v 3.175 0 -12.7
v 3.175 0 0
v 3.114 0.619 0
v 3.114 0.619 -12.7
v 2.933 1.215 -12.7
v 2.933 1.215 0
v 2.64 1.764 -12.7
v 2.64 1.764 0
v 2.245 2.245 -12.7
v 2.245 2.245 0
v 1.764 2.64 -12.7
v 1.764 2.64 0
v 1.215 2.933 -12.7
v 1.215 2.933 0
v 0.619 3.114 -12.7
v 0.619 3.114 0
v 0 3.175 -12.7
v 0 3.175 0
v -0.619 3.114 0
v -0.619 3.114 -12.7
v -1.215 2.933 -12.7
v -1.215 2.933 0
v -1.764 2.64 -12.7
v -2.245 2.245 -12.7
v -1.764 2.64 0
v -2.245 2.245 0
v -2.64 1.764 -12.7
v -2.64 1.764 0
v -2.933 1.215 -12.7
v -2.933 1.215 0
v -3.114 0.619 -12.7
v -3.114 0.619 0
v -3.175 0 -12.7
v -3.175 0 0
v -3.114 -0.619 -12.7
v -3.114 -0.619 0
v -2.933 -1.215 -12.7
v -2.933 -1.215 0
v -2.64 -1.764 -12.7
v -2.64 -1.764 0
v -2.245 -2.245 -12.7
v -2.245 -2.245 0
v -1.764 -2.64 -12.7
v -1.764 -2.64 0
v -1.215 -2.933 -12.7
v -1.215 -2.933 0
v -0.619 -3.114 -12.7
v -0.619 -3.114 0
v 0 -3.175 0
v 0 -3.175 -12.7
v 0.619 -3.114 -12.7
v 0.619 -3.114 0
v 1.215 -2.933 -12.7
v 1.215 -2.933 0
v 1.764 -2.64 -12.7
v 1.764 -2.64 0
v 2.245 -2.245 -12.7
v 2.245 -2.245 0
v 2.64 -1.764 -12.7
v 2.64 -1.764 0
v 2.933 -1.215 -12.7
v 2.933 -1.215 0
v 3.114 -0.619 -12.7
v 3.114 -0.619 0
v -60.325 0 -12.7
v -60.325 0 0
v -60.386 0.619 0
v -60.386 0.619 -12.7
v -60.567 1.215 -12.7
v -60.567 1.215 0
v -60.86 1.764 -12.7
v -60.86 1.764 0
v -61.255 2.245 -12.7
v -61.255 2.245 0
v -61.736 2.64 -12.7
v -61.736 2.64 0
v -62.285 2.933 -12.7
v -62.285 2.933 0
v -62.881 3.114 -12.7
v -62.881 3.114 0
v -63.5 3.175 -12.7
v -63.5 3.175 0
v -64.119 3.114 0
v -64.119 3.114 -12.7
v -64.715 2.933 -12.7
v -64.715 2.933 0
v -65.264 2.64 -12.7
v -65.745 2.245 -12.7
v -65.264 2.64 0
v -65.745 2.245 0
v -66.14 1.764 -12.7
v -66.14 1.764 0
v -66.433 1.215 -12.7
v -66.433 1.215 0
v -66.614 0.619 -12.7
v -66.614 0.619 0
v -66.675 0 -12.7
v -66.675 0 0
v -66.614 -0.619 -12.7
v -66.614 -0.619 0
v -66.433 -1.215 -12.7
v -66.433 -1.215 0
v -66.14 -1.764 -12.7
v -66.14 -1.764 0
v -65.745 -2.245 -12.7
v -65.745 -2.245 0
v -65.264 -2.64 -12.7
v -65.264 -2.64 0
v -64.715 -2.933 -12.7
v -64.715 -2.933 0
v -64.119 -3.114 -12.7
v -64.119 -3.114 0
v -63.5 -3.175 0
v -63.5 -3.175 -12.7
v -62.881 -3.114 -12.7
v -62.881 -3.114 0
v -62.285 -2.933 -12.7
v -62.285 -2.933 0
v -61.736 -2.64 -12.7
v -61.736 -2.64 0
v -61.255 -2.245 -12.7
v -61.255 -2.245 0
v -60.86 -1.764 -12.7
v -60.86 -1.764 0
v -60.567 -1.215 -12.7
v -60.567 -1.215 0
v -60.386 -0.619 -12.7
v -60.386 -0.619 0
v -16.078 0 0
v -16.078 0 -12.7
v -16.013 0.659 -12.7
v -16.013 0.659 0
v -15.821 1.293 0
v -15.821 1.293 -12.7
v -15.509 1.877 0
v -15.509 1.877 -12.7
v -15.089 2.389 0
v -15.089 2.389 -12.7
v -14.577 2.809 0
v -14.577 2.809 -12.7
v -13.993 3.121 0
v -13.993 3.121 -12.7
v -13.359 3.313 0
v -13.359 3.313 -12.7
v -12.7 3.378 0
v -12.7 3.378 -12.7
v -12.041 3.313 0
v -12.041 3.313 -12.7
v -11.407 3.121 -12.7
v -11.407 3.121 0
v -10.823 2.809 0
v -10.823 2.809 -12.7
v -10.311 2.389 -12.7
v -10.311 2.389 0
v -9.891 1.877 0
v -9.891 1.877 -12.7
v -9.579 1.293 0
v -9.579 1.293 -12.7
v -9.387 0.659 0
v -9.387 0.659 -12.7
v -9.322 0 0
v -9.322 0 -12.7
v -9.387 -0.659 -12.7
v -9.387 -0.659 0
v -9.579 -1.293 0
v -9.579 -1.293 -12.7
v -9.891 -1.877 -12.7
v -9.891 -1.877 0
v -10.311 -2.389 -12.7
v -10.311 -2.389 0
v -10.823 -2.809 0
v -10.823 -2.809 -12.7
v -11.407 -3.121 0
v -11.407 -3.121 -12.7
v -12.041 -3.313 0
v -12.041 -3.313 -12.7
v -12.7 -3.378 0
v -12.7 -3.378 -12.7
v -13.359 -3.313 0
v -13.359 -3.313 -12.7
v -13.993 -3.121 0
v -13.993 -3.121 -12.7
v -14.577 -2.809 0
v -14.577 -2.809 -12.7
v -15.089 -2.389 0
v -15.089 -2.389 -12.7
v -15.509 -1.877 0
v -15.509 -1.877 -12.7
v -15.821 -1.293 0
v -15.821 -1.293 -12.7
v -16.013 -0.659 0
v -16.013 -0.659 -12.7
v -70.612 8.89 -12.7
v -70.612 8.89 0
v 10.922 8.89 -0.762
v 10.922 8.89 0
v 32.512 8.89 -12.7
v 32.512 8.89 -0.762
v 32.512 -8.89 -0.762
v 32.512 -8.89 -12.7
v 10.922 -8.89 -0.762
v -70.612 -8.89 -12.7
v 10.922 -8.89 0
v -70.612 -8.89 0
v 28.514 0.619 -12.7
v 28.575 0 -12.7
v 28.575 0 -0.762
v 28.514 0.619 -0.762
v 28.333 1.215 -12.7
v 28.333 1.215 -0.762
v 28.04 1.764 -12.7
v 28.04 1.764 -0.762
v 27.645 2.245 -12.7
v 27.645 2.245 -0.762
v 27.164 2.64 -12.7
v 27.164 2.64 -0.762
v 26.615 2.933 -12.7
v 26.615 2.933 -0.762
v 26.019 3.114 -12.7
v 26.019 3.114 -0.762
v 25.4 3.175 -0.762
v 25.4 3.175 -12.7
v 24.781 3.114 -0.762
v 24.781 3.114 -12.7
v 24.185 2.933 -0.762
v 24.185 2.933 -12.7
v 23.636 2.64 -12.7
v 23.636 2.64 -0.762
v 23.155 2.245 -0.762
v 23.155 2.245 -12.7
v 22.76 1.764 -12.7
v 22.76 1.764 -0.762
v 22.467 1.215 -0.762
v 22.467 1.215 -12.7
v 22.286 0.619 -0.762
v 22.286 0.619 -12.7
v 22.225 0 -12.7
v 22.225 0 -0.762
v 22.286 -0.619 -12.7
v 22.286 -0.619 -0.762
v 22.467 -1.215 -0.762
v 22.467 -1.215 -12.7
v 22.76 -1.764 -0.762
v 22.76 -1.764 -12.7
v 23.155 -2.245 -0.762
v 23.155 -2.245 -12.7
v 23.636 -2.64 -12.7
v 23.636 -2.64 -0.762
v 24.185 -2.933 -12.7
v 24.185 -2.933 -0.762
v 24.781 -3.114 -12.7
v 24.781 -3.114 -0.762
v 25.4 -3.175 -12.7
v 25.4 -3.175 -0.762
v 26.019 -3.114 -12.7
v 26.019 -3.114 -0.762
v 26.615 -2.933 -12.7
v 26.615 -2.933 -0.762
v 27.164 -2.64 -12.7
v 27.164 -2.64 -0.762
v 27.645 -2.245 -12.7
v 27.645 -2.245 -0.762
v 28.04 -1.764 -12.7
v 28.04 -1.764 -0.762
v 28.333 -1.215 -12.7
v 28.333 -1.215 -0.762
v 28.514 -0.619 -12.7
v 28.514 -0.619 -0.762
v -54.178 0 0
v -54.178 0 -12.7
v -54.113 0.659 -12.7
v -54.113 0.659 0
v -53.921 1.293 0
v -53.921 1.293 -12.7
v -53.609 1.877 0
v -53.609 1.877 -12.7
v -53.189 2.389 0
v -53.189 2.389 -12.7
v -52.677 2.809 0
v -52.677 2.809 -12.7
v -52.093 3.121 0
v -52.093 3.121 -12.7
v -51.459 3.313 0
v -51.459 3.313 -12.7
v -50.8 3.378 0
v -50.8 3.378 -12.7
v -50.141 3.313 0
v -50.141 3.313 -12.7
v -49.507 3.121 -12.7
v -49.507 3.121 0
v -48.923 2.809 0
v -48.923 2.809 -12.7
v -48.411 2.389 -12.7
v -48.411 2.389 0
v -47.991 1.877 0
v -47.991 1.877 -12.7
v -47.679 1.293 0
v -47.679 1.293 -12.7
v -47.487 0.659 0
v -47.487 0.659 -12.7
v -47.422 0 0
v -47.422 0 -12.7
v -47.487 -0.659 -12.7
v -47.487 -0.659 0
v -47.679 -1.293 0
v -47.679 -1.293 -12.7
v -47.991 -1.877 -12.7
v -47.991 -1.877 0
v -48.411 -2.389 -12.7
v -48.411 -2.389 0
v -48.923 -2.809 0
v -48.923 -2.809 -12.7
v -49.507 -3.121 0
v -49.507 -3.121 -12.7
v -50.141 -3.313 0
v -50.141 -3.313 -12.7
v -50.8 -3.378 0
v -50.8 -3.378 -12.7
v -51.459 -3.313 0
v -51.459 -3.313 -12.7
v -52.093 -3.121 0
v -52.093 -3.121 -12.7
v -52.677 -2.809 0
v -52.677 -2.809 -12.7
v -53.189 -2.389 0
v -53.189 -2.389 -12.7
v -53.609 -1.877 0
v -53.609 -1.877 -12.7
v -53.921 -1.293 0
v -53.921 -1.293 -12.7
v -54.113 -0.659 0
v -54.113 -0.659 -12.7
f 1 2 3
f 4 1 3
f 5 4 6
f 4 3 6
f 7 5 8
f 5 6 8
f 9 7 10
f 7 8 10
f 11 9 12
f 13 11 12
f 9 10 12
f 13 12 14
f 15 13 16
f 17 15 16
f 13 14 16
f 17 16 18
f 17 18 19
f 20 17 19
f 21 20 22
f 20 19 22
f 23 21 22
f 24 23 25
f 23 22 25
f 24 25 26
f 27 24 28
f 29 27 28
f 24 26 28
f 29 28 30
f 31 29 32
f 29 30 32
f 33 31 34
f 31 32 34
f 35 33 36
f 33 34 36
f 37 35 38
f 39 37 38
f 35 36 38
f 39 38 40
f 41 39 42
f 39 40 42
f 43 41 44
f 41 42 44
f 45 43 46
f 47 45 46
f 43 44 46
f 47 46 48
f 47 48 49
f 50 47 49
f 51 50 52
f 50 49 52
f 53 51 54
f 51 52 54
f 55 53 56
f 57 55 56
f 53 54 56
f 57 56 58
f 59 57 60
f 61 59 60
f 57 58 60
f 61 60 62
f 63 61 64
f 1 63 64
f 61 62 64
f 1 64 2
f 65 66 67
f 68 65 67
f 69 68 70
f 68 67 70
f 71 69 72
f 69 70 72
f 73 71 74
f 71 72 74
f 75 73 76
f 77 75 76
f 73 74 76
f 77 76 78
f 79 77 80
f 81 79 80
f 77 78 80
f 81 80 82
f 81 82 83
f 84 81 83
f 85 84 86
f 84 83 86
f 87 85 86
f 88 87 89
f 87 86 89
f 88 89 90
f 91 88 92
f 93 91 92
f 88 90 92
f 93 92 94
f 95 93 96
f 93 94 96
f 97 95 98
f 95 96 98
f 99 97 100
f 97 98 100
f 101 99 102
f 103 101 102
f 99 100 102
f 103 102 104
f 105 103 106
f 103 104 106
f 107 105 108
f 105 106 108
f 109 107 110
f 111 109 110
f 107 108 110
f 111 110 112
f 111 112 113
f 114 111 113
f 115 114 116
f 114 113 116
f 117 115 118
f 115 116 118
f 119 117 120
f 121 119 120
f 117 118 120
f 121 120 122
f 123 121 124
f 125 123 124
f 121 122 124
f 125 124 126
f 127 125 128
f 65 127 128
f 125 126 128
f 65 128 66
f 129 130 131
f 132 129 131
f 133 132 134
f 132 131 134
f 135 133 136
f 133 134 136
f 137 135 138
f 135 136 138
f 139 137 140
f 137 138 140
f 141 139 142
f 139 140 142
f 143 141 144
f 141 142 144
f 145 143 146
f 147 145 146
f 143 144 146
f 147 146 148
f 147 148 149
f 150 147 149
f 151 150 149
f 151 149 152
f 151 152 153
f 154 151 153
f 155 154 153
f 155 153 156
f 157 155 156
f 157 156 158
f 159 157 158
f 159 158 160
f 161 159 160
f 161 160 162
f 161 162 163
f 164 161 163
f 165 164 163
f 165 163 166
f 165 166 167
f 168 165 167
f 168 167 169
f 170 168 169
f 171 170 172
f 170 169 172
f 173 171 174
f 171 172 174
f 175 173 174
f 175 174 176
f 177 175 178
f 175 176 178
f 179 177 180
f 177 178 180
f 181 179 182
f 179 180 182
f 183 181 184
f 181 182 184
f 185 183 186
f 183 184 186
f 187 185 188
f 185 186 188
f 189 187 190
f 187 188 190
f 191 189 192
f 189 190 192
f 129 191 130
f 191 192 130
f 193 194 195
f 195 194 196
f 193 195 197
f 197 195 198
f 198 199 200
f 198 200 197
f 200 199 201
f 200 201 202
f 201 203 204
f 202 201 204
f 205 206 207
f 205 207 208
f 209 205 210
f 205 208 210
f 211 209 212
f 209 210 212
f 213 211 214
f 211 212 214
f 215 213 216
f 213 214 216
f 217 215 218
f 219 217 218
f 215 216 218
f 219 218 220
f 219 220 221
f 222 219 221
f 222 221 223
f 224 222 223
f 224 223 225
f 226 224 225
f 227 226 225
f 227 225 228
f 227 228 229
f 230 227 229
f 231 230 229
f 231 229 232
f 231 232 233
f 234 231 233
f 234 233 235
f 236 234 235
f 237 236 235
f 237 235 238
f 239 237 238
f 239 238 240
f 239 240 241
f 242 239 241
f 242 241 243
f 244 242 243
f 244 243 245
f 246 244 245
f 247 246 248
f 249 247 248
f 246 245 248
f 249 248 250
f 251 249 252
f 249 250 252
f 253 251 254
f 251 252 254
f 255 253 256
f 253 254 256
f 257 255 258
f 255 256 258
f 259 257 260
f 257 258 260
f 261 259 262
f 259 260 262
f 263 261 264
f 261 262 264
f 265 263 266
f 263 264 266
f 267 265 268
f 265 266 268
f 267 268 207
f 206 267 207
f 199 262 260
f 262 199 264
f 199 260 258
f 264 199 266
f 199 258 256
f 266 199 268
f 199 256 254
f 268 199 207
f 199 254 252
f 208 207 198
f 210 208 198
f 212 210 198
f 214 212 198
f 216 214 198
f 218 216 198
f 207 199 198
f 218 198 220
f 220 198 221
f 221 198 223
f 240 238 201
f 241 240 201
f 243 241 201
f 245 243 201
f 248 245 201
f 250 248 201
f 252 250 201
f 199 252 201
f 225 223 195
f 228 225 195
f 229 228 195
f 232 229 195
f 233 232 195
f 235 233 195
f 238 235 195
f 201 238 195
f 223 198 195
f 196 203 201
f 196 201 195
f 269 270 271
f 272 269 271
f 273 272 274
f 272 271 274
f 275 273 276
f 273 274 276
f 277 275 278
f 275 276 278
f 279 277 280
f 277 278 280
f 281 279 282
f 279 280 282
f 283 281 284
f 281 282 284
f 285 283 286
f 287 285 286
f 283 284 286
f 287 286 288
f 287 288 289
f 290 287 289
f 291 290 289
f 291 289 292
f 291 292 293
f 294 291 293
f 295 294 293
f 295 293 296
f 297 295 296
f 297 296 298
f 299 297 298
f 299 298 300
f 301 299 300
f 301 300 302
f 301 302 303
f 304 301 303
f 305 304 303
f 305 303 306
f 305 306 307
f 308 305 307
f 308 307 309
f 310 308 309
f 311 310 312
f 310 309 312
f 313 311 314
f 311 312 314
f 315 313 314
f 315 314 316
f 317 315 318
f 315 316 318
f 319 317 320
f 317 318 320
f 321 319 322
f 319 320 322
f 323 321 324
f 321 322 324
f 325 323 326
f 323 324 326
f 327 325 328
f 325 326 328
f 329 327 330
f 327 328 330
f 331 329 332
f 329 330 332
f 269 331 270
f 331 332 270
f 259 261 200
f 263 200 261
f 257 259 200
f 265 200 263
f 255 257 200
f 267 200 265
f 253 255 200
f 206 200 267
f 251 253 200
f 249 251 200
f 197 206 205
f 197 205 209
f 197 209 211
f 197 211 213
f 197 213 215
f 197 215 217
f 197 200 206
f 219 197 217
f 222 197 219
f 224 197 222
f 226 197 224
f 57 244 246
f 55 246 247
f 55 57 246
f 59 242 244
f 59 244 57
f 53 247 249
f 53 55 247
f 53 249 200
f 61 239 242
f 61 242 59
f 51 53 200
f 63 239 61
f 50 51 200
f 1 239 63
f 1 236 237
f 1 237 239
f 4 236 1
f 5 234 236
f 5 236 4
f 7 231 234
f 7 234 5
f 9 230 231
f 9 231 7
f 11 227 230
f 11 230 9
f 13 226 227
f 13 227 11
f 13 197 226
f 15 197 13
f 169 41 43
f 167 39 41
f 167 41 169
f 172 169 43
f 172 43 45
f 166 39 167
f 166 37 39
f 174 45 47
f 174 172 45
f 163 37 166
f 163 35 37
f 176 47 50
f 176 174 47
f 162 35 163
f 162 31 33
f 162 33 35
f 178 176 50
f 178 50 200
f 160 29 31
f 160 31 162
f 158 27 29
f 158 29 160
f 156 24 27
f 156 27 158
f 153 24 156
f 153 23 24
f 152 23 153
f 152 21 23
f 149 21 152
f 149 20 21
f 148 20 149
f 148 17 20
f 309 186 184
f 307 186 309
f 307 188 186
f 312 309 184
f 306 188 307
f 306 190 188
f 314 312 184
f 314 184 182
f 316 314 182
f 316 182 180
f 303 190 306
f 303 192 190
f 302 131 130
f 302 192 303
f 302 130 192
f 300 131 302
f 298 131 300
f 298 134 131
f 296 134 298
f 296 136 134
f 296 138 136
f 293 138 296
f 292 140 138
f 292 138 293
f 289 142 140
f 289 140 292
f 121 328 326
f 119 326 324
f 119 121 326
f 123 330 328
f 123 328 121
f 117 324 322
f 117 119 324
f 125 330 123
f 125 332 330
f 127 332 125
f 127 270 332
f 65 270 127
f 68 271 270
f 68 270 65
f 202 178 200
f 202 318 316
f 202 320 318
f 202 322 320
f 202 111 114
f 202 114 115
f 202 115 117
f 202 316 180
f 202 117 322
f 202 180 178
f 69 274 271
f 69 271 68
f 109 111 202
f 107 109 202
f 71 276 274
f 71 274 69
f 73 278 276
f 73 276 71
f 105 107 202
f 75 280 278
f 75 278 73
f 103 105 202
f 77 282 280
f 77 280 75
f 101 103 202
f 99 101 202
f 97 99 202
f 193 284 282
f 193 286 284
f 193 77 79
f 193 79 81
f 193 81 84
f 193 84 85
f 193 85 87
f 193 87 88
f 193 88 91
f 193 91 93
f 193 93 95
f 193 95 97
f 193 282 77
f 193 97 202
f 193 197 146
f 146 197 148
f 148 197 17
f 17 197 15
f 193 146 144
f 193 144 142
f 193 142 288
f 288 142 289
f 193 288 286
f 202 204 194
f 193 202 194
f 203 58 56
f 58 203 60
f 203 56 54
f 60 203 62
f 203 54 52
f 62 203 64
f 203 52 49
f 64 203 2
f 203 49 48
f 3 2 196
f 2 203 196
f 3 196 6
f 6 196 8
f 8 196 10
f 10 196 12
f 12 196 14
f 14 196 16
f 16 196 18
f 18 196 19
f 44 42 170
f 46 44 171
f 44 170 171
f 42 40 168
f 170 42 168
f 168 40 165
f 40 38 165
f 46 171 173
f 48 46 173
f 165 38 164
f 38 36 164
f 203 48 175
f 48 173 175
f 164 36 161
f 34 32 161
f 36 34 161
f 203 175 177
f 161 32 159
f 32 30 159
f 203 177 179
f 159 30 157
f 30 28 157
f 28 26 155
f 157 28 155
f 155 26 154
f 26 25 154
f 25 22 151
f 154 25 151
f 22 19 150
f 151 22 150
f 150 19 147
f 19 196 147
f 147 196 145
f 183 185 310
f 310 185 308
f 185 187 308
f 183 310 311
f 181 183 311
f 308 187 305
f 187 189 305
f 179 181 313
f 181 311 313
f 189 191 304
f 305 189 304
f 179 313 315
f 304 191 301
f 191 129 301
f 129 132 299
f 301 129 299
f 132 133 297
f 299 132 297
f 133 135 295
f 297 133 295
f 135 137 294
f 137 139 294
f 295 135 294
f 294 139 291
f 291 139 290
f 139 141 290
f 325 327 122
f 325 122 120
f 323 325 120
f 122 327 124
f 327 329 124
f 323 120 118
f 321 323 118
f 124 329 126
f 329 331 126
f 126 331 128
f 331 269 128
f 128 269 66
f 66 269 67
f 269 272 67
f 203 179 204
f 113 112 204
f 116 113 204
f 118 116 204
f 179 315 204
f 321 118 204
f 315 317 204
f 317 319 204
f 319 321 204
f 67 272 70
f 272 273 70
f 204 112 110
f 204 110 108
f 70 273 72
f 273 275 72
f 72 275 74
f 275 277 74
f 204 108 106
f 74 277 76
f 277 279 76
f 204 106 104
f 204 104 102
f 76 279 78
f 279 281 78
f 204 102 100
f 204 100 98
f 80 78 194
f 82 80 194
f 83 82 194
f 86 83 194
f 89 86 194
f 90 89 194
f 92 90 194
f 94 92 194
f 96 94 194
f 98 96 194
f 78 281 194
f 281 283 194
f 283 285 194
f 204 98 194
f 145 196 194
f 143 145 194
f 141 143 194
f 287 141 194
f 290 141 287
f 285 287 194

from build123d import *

# Parameters (mm, degrees)
SKETCH_R                    = 3.175
BOSS_EXTRUDE1_DEPTH         = 12.7
SKETCH3_W                   = 21.59
SKETCH3_H                   = 17.78
CUT_EXTRUDE1_DEPTH          = 0.762
F_1_4_CLEARANCE_HOLE1_D     = 6.7564
F_1_4_CLEARANCE_HOLE1_DEPTH = 12.7


with BuildPart() as part:
    # Sketch → Boss-Extrude1 (new body)
    with BuildSketch(Plane.XY):
        Polygon((-70.612, 8.89), (32.512, 8.89), (32.512, 0), (32.512, -8.89), (-70.612, -8.89), align=None)
        with Locations((-63.5, 0)):
            Circle(SKETCH_R, mode=Mode.SUBTRACT)
        Circle(SKETCH_R, mode=Mode.SUBTRACT)
        with Locations((25.4, 0)):
            Circle(SKETCH_R, mode=Mode.SUBTRACT)
    extrude(amount=-BOSS_EXTRUDE1_DEPTH)

    # Sketch3 → Cut-Extrude1 (cut)
    with BuildSketch(Plane(origin=(0, 0, 0), x_dir=(-1, 0, 0), z_dir=(0, 0, -1))):
        with Locations((-21.717, 0)):
            Rectangle(SKETCH3_W, SKETCH3_H)
    extrude(amount=CUT_EXTRUDE1_DEPTH, mode=Mode.SUBTRACT)

    # 1/4 Clearance Hole1
    with Locations(Plane.XY):
        with Locations((-50.8, 0), (-12.7, 0)):
            Hole(F_1_4_CLEARANCE_HOLE1_D / 2, depth=F_1_4_CLEARANCE_HOLE1_DEPTH)


solid = part.part
